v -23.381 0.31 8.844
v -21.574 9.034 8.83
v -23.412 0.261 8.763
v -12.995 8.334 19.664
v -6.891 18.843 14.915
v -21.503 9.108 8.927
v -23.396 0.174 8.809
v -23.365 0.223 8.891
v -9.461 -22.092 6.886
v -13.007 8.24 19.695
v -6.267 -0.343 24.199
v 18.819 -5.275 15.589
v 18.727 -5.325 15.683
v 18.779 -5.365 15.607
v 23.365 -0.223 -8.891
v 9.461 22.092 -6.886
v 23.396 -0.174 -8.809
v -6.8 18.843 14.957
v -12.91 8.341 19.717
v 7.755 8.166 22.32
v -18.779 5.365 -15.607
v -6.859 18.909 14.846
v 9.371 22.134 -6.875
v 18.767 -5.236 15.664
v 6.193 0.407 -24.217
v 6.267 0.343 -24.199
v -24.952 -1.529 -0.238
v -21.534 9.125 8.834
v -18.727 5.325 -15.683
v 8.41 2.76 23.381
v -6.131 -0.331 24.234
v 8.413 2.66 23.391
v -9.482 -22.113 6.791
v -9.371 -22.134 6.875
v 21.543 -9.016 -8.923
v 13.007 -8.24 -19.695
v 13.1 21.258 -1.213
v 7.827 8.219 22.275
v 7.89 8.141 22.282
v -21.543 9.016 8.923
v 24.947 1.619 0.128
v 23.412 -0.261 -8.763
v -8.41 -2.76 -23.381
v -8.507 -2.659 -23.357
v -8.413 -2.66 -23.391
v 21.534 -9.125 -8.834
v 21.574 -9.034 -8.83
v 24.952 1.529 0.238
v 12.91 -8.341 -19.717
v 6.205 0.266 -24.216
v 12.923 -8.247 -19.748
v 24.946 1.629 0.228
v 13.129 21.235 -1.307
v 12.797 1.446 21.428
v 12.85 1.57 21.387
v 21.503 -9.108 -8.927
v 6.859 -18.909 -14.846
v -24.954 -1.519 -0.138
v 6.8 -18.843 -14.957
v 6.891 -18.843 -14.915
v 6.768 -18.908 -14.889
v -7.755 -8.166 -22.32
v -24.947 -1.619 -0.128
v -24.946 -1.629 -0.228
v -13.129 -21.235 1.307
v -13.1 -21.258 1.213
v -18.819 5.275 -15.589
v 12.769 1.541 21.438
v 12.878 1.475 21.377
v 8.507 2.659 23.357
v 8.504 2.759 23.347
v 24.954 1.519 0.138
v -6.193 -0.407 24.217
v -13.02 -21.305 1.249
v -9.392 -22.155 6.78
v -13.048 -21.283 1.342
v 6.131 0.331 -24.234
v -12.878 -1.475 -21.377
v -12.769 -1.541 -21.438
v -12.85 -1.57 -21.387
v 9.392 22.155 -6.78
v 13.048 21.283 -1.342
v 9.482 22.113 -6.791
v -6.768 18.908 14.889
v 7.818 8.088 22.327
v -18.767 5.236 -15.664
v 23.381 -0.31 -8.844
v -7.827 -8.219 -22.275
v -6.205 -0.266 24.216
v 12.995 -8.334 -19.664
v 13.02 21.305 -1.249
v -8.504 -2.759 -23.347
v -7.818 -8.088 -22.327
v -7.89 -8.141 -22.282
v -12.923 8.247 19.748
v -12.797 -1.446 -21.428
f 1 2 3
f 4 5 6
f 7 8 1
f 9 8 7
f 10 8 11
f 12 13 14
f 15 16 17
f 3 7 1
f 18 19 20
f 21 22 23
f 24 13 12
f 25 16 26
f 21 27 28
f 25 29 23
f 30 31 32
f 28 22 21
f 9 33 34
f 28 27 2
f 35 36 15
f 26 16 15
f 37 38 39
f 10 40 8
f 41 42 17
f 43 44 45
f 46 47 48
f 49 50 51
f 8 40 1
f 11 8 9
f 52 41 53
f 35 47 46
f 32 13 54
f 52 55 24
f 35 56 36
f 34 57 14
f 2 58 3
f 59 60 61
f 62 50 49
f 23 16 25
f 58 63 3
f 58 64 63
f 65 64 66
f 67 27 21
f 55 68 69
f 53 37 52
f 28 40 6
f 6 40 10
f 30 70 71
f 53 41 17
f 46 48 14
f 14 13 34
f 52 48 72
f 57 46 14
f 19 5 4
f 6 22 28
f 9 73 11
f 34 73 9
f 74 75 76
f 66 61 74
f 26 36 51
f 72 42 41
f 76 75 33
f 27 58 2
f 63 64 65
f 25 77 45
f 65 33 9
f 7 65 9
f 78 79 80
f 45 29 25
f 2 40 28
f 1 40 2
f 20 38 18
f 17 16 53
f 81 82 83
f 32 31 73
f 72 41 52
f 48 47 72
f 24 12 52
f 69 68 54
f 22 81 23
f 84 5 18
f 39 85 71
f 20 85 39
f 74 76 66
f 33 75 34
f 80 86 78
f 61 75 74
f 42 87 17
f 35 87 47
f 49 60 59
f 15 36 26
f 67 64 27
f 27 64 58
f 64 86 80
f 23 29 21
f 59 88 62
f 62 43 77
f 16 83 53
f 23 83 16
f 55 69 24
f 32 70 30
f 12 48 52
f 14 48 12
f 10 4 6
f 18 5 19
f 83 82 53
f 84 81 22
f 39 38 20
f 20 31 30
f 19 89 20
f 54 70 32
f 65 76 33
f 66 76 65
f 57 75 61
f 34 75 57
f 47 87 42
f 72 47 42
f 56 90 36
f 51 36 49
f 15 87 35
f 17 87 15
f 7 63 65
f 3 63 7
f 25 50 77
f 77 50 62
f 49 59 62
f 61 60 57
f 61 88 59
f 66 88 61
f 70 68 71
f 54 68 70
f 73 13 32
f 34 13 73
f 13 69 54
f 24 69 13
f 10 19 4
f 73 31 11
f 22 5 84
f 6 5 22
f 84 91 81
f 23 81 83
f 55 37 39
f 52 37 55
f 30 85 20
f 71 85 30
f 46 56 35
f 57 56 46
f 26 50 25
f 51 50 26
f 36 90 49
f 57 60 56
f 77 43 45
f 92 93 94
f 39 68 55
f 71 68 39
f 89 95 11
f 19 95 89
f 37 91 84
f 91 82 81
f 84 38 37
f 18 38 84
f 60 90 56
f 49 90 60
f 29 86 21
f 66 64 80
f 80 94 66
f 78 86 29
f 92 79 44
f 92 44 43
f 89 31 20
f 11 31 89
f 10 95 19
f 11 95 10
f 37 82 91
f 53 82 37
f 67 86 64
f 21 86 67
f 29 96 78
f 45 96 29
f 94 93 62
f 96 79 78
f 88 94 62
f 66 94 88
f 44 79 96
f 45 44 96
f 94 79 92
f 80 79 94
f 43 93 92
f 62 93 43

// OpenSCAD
// experimental generator for:
//  splinters
//  basaltish columns
//  irregular crystals and cristalline like structures
//  irregular spheres
//  asteroids
//  failed planets.

// the more points, the more spherical the resulting shape becomes
points=24;	// [6:2:128]

// measured between the most widely apart points
diameter=50;	// [2:200]

// the impression on surface made.
stanchions=0;	// [0:square foot, 1:circular foot]

// size of stanchion footprint
footprint=0.1;	// [0.1:0.1:20]

hull()  {
	for (i=[1:points/2])   {
		orientation=rands(0, 360, 3);
		rotate([orientation[0], orientation[1], orientation[2]])
		if (stanchions) {
			cylinder(diameter, footprint, footprint);
		} else {
			cube([diameter, footprint, footprint], center=true);
		}
	}
}
